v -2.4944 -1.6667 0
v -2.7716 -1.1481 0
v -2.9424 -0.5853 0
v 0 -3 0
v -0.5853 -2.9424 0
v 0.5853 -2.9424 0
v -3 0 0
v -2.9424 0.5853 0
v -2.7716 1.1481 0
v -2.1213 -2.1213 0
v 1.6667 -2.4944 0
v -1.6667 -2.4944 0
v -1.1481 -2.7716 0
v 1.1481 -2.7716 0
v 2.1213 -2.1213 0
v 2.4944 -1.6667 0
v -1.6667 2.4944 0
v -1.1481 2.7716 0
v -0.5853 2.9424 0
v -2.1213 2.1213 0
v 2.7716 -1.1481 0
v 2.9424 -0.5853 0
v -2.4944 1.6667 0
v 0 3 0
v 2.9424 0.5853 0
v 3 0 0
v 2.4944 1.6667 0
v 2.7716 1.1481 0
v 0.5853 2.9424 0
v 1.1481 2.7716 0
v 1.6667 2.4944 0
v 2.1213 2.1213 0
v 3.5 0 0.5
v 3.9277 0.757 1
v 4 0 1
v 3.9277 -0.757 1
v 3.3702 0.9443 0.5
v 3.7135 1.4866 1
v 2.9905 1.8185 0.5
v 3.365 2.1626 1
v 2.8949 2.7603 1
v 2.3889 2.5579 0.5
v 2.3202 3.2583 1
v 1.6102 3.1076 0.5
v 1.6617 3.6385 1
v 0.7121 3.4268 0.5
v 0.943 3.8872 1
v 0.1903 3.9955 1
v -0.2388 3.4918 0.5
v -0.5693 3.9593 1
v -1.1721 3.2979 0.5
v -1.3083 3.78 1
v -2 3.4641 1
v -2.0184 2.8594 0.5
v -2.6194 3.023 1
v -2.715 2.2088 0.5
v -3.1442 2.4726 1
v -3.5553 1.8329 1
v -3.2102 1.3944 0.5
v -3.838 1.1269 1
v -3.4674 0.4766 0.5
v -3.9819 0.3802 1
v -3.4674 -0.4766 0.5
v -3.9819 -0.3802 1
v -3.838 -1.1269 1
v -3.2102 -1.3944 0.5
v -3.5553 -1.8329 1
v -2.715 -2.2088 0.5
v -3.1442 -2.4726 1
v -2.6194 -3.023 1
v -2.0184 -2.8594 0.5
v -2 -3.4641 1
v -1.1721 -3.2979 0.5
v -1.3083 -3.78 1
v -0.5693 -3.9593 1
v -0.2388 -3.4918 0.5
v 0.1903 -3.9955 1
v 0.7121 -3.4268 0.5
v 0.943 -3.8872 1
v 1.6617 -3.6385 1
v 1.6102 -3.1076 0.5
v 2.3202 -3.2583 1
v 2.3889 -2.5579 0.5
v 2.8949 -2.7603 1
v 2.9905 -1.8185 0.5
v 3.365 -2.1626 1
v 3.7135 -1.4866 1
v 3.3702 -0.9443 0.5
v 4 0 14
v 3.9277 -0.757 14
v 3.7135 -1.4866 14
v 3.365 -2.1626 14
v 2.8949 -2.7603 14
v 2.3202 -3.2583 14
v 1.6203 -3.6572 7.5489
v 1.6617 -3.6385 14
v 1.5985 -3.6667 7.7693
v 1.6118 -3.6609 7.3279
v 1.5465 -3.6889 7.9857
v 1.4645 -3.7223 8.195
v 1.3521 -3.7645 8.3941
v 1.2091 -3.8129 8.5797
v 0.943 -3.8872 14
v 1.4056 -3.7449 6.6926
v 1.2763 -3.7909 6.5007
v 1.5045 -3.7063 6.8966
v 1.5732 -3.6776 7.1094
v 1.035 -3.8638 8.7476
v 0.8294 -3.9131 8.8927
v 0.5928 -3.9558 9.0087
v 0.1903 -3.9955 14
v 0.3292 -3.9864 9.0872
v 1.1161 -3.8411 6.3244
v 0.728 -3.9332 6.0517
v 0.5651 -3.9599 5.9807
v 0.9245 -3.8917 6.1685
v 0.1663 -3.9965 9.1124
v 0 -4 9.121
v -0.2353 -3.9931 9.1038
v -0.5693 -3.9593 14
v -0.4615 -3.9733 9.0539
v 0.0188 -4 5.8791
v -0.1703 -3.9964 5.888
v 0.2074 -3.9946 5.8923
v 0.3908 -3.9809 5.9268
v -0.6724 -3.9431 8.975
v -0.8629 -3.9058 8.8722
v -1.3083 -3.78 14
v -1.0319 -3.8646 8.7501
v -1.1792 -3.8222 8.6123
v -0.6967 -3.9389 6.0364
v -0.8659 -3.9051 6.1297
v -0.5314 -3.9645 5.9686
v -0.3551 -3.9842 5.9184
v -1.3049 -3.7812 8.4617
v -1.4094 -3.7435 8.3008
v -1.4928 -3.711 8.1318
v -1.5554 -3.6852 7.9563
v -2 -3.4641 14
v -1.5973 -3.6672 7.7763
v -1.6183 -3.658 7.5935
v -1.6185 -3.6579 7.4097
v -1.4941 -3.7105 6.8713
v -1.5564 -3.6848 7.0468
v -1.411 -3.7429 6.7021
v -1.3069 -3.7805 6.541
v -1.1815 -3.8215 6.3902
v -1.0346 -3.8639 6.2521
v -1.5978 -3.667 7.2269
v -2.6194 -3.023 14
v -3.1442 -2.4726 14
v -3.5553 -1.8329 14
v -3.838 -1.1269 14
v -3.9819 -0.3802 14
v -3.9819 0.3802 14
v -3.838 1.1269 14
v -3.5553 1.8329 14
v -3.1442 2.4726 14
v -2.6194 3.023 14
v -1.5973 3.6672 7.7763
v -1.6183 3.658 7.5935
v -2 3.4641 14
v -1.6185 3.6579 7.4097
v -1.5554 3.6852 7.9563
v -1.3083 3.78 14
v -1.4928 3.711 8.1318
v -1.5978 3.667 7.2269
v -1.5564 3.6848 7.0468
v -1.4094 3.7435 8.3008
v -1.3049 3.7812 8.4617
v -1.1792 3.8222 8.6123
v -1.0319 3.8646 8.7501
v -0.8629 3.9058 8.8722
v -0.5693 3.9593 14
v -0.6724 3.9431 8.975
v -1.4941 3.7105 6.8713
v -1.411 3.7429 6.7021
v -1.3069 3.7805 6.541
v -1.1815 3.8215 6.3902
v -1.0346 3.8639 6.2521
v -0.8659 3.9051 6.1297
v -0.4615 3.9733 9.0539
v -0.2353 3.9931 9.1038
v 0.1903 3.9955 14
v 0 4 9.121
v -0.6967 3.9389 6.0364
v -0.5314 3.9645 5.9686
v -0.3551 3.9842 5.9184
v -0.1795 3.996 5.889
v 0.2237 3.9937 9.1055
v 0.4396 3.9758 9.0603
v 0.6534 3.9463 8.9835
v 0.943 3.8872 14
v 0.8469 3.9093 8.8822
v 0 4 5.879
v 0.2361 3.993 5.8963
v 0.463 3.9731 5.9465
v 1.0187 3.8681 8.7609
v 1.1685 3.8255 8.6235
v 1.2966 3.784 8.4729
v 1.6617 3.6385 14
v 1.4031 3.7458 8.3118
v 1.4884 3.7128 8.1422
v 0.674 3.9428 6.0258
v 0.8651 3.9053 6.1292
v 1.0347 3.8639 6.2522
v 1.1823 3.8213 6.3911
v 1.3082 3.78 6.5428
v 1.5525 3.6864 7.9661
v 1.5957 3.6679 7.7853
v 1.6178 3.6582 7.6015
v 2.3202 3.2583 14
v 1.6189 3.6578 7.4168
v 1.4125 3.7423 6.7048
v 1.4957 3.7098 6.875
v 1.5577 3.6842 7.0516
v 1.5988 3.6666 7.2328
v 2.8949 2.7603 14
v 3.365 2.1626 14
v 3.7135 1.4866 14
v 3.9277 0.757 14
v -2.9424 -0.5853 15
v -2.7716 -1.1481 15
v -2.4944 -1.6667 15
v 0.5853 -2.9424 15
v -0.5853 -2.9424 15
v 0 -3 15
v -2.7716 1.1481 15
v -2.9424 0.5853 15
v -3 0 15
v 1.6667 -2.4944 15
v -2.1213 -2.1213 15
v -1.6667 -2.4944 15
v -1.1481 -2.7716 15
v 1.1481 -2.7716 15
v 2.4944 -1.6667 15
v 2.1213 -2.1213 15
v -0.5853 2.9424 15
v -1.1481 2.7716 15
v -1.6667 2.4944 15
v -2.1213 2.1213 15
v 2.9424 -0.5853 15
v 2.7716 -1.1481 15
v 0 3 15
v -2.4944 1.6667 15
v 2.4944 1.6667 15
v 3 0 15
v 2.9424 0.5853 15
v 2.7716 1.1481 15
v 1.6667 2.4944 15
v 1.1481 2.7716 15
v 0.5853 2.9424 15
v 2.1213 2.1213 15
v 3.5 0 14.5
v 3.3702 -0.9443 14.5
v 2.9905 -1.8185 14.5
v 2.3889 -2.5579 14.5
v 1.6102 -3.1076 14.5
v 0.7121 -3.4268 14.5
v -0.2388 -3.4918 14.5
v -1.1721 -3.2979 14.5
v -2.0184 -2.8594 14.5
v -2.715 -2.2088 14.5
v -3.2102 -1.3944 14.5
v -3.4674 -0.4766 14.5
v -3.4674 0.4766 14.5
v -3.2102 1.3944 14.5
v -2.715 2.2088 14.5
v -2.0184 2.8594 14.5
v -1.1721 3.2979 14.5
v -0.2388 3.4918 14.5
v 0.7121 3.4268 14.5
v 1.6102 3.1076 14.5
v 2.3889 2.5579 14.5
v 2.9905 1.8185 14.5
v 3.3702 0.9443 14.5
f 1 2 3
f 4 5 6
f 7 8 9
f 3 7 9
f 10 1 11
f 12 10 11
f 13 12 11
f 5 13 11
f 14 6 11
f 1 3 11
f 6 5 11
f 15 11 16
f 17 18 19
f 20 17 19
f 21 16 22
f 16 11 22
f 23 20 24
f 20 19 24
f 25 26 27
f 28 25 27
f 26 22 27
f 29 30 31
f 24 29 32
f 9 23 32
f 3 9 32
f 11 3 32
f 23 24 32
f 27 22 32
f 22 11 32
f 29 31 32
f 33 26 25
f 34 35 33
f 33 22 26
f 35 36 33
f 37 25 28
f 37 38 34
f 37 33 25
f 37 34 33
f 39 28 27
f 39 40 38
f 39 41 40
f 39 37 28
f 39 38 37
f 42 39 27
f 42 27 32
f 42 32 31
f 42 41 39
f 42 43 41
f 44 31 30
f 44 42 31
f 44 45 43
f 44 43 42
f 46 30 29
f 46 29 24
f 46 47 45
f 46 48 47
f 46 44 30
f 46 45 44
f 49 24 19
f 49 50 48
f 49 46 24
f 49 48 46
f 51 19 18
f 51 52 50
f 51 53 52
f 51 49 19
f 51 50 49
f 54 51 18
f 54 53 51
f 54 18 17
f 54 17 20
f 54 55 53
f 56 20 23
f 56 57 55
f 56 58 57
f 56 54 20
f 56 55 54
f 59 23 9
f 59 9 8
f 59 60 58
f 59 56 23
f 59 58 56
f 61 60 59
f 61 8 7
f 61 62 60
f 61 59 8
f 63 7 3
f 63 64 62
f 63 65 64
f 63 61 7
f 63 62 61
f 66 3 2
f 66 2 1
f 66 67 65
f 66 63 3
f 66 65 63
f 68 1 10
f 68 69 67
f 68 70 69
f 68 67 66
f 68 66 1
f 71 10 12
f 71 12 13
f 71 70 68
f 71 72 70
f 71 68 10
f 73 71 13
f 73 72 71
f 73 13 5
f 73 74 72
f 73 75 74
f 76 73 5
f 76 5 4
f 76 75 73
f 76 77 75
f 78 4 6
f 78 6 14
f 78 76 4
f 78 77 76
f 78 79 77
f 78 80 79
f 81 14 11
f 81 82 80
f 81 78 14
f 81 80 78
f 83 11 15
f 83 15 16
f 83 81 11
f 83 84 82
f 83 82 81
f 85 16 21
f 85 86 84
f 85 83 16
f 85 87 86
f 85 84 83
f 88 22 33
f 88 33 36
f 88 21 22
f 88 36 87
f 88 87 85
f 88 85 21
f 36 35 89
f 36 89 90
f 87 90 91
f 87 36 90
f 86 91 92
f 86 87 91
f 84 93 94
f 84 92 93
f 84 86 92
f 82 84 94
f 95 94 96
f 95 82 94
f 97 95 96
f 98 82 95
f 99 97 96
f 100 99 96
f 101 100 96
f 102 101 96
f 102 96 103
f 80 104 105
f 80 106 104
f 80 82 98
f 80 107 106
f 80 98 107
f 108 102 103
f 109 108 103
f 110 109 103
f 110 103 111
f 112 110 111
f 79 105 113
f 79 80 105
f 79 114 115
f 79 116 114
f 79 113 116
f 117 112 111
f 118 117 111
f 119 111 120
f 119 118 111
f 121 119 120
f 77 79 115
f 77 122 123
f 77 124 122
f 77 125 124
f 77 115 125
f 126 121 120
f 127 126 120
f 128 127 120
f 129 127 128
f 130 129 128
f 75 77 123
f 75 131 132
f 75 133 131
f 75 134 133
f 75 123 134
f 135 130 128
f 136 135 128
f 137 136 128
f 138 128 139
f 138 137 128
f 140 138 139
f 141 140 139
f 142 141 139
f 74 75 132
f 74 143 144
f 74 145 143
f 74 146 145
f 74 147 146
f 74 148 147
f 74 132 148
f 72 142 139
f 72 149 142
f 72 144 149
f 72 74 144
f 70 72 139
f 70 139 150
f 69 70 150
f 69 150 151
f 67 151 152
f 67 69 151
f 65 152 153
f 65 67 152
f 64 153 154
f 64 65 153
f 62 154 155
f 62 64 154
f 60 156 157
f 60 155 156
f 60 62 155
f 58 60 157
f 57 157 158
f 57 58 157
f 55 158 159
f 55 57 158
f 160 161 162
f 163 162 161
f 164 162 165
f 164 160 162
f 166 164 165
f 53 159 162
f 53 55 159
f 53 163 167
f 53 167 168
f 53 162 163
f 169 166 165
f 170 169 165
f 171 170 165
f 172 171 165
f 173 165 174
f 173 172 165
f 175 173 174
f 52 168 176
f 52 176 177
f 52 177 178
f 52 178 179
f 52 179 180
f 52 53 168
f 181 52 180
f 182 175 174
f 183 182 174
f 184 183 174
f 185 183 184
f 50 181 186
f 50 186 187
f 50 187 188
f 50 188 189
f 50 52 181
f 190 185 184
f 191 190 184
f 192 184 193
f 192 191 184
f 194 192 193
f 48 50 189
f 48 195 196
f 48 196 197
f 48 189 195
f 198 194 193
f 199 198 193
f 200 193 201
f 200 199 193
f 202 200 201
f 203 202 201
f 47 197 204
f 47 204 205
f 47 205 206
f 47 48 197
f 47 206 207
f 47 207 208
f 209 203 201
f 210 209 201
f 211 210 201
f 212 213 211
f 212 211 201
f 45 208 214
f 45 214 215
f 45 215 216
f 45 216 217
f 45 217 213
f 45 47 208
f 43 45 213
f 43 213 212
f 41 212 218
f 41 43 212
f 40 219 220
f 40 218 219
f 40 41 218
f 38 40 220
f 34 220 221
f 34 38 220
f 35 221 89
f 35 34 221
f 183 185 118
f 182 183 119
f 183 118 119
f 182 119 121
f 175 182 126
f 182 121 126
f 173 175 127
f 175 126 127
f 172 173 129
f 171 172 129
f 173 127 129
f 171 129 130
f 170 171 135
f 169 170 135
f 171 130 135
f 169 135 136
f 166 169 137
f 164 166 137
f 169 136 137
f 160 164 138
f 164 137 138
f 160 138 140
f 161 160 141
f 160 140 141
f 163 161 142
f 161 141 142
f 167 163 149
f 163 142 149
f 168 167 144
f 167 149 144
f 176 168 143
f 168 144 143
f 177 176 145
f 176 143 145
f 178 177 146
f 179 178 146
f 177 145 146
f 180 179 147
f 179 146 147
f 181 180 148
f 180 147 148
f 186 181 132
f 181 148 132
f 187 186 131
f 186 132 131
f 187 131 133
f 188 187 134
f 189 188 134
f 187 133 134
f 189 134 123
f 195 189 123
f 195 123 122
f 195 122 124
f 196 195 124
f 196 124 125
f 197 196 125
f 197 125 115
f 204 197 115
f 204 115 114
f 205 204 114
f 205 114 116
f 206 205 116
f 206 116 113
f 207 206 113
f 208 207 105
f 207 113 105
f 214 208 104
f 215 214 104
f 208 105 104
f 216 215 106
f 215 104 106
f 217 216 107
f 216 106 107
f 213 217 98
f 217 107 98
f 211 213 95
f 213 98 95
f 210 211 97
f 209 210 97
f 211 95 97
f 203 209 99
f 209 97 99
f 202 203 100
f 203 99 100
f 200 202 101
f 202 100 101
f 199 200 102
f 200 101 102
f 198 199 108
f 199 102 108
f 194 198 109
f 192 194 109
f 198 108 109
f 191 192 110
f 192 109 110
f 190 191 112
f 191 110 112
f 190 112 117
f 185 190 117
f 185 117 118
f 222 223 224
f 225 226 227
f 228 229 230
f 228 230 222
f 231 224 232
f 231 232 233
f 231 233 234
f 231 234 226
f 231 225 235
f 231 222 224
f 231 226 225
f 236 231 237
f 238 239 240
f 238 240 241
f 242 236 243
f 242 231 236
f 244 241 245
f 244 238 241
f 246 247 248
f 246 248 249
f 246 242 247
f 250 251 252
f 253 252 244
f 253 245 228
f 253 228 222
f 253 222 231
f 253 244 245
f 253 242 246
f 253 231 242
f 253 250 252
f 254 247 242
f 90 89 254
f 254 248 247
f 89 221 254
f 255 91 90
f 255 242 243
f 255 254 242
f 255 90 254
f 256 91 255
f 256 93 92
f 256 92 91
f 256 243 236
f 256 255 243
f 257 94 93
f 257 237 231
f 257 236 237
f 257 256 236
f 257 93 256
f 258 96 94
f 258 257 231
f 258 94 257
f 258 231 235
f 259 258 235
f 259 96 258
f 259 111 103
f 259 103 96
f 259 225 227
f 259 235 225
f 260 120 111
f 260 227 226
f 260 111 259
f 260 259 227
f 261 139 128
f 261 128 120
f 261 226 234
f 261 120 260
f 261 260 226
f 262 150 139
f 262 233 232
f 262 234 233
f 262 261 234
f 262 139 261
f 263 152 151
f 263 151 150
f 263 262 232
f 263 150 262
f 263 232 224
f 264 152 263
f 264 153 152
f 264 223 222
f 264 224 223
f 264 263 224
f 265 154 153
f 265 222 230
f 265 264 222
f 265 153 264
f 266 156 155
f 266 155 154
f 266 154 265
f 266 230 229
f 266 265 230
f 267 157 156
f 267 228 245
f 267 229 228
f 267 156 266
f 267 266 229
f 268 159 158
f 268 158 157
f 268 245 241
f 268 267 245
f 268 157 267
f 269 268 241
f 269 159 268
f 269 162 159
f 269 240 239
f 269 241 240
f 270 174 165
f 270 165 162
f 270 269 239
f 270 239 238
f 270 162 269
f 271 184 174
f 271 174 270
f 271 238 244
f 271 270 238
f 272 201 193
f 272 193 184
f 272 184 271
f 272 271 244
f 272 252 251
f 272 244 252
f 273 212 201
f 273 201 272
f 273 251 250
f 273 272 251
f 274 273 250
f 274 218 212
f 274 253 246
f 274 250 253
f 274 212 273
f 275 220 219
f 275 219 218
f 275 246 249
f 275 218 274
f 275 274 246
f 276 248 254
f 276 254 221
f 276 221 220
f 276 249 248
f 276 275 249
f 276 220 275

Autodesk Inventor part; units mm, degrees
ref_plane "YZ Plane" through (0, 0, 0) normal (1, 0, 0) x (0, 1, 0)
ref_plane "XZ Plane" through (0, 0, 0) normal (0, 1, 0) x (-1, 0, 0)
sketch "Skizze1" plane through (0, 0, 0) normal (0, 0, 1) x (1, 0, 0)
  circle A0 centre (0, 0) radius 4
  point P0 (0, 4)
  dimension "d0" = 8
extrude "Extrusion1" add sketch "Skizze1" along normal blind 15
ref_plane "Arbeitsebene1" through (0, 4, 0) normal (0, 1, 0) x (-1, 0, 0)
sketch "Skizze2" plane through (0, 4, 0) normal (0, 1, 0) x (-1, 0, 0)
  point P0 (0, 0)
  point P1 (0, 7.5)
  dimension "d3" = 7.5
hole "Bohrung1" at (0, 4, 7.5) direction (0, -1, 0) diameter 3.242 end through all thread size "M4x0.7" class "6H" standard "ANSI Metric M Profile"
chamfer "Fase1" distance 1 angle 45 2 edges at (-4, 0, 0) (-4, 0, 15)
properties part number "LANGMUTTER"
